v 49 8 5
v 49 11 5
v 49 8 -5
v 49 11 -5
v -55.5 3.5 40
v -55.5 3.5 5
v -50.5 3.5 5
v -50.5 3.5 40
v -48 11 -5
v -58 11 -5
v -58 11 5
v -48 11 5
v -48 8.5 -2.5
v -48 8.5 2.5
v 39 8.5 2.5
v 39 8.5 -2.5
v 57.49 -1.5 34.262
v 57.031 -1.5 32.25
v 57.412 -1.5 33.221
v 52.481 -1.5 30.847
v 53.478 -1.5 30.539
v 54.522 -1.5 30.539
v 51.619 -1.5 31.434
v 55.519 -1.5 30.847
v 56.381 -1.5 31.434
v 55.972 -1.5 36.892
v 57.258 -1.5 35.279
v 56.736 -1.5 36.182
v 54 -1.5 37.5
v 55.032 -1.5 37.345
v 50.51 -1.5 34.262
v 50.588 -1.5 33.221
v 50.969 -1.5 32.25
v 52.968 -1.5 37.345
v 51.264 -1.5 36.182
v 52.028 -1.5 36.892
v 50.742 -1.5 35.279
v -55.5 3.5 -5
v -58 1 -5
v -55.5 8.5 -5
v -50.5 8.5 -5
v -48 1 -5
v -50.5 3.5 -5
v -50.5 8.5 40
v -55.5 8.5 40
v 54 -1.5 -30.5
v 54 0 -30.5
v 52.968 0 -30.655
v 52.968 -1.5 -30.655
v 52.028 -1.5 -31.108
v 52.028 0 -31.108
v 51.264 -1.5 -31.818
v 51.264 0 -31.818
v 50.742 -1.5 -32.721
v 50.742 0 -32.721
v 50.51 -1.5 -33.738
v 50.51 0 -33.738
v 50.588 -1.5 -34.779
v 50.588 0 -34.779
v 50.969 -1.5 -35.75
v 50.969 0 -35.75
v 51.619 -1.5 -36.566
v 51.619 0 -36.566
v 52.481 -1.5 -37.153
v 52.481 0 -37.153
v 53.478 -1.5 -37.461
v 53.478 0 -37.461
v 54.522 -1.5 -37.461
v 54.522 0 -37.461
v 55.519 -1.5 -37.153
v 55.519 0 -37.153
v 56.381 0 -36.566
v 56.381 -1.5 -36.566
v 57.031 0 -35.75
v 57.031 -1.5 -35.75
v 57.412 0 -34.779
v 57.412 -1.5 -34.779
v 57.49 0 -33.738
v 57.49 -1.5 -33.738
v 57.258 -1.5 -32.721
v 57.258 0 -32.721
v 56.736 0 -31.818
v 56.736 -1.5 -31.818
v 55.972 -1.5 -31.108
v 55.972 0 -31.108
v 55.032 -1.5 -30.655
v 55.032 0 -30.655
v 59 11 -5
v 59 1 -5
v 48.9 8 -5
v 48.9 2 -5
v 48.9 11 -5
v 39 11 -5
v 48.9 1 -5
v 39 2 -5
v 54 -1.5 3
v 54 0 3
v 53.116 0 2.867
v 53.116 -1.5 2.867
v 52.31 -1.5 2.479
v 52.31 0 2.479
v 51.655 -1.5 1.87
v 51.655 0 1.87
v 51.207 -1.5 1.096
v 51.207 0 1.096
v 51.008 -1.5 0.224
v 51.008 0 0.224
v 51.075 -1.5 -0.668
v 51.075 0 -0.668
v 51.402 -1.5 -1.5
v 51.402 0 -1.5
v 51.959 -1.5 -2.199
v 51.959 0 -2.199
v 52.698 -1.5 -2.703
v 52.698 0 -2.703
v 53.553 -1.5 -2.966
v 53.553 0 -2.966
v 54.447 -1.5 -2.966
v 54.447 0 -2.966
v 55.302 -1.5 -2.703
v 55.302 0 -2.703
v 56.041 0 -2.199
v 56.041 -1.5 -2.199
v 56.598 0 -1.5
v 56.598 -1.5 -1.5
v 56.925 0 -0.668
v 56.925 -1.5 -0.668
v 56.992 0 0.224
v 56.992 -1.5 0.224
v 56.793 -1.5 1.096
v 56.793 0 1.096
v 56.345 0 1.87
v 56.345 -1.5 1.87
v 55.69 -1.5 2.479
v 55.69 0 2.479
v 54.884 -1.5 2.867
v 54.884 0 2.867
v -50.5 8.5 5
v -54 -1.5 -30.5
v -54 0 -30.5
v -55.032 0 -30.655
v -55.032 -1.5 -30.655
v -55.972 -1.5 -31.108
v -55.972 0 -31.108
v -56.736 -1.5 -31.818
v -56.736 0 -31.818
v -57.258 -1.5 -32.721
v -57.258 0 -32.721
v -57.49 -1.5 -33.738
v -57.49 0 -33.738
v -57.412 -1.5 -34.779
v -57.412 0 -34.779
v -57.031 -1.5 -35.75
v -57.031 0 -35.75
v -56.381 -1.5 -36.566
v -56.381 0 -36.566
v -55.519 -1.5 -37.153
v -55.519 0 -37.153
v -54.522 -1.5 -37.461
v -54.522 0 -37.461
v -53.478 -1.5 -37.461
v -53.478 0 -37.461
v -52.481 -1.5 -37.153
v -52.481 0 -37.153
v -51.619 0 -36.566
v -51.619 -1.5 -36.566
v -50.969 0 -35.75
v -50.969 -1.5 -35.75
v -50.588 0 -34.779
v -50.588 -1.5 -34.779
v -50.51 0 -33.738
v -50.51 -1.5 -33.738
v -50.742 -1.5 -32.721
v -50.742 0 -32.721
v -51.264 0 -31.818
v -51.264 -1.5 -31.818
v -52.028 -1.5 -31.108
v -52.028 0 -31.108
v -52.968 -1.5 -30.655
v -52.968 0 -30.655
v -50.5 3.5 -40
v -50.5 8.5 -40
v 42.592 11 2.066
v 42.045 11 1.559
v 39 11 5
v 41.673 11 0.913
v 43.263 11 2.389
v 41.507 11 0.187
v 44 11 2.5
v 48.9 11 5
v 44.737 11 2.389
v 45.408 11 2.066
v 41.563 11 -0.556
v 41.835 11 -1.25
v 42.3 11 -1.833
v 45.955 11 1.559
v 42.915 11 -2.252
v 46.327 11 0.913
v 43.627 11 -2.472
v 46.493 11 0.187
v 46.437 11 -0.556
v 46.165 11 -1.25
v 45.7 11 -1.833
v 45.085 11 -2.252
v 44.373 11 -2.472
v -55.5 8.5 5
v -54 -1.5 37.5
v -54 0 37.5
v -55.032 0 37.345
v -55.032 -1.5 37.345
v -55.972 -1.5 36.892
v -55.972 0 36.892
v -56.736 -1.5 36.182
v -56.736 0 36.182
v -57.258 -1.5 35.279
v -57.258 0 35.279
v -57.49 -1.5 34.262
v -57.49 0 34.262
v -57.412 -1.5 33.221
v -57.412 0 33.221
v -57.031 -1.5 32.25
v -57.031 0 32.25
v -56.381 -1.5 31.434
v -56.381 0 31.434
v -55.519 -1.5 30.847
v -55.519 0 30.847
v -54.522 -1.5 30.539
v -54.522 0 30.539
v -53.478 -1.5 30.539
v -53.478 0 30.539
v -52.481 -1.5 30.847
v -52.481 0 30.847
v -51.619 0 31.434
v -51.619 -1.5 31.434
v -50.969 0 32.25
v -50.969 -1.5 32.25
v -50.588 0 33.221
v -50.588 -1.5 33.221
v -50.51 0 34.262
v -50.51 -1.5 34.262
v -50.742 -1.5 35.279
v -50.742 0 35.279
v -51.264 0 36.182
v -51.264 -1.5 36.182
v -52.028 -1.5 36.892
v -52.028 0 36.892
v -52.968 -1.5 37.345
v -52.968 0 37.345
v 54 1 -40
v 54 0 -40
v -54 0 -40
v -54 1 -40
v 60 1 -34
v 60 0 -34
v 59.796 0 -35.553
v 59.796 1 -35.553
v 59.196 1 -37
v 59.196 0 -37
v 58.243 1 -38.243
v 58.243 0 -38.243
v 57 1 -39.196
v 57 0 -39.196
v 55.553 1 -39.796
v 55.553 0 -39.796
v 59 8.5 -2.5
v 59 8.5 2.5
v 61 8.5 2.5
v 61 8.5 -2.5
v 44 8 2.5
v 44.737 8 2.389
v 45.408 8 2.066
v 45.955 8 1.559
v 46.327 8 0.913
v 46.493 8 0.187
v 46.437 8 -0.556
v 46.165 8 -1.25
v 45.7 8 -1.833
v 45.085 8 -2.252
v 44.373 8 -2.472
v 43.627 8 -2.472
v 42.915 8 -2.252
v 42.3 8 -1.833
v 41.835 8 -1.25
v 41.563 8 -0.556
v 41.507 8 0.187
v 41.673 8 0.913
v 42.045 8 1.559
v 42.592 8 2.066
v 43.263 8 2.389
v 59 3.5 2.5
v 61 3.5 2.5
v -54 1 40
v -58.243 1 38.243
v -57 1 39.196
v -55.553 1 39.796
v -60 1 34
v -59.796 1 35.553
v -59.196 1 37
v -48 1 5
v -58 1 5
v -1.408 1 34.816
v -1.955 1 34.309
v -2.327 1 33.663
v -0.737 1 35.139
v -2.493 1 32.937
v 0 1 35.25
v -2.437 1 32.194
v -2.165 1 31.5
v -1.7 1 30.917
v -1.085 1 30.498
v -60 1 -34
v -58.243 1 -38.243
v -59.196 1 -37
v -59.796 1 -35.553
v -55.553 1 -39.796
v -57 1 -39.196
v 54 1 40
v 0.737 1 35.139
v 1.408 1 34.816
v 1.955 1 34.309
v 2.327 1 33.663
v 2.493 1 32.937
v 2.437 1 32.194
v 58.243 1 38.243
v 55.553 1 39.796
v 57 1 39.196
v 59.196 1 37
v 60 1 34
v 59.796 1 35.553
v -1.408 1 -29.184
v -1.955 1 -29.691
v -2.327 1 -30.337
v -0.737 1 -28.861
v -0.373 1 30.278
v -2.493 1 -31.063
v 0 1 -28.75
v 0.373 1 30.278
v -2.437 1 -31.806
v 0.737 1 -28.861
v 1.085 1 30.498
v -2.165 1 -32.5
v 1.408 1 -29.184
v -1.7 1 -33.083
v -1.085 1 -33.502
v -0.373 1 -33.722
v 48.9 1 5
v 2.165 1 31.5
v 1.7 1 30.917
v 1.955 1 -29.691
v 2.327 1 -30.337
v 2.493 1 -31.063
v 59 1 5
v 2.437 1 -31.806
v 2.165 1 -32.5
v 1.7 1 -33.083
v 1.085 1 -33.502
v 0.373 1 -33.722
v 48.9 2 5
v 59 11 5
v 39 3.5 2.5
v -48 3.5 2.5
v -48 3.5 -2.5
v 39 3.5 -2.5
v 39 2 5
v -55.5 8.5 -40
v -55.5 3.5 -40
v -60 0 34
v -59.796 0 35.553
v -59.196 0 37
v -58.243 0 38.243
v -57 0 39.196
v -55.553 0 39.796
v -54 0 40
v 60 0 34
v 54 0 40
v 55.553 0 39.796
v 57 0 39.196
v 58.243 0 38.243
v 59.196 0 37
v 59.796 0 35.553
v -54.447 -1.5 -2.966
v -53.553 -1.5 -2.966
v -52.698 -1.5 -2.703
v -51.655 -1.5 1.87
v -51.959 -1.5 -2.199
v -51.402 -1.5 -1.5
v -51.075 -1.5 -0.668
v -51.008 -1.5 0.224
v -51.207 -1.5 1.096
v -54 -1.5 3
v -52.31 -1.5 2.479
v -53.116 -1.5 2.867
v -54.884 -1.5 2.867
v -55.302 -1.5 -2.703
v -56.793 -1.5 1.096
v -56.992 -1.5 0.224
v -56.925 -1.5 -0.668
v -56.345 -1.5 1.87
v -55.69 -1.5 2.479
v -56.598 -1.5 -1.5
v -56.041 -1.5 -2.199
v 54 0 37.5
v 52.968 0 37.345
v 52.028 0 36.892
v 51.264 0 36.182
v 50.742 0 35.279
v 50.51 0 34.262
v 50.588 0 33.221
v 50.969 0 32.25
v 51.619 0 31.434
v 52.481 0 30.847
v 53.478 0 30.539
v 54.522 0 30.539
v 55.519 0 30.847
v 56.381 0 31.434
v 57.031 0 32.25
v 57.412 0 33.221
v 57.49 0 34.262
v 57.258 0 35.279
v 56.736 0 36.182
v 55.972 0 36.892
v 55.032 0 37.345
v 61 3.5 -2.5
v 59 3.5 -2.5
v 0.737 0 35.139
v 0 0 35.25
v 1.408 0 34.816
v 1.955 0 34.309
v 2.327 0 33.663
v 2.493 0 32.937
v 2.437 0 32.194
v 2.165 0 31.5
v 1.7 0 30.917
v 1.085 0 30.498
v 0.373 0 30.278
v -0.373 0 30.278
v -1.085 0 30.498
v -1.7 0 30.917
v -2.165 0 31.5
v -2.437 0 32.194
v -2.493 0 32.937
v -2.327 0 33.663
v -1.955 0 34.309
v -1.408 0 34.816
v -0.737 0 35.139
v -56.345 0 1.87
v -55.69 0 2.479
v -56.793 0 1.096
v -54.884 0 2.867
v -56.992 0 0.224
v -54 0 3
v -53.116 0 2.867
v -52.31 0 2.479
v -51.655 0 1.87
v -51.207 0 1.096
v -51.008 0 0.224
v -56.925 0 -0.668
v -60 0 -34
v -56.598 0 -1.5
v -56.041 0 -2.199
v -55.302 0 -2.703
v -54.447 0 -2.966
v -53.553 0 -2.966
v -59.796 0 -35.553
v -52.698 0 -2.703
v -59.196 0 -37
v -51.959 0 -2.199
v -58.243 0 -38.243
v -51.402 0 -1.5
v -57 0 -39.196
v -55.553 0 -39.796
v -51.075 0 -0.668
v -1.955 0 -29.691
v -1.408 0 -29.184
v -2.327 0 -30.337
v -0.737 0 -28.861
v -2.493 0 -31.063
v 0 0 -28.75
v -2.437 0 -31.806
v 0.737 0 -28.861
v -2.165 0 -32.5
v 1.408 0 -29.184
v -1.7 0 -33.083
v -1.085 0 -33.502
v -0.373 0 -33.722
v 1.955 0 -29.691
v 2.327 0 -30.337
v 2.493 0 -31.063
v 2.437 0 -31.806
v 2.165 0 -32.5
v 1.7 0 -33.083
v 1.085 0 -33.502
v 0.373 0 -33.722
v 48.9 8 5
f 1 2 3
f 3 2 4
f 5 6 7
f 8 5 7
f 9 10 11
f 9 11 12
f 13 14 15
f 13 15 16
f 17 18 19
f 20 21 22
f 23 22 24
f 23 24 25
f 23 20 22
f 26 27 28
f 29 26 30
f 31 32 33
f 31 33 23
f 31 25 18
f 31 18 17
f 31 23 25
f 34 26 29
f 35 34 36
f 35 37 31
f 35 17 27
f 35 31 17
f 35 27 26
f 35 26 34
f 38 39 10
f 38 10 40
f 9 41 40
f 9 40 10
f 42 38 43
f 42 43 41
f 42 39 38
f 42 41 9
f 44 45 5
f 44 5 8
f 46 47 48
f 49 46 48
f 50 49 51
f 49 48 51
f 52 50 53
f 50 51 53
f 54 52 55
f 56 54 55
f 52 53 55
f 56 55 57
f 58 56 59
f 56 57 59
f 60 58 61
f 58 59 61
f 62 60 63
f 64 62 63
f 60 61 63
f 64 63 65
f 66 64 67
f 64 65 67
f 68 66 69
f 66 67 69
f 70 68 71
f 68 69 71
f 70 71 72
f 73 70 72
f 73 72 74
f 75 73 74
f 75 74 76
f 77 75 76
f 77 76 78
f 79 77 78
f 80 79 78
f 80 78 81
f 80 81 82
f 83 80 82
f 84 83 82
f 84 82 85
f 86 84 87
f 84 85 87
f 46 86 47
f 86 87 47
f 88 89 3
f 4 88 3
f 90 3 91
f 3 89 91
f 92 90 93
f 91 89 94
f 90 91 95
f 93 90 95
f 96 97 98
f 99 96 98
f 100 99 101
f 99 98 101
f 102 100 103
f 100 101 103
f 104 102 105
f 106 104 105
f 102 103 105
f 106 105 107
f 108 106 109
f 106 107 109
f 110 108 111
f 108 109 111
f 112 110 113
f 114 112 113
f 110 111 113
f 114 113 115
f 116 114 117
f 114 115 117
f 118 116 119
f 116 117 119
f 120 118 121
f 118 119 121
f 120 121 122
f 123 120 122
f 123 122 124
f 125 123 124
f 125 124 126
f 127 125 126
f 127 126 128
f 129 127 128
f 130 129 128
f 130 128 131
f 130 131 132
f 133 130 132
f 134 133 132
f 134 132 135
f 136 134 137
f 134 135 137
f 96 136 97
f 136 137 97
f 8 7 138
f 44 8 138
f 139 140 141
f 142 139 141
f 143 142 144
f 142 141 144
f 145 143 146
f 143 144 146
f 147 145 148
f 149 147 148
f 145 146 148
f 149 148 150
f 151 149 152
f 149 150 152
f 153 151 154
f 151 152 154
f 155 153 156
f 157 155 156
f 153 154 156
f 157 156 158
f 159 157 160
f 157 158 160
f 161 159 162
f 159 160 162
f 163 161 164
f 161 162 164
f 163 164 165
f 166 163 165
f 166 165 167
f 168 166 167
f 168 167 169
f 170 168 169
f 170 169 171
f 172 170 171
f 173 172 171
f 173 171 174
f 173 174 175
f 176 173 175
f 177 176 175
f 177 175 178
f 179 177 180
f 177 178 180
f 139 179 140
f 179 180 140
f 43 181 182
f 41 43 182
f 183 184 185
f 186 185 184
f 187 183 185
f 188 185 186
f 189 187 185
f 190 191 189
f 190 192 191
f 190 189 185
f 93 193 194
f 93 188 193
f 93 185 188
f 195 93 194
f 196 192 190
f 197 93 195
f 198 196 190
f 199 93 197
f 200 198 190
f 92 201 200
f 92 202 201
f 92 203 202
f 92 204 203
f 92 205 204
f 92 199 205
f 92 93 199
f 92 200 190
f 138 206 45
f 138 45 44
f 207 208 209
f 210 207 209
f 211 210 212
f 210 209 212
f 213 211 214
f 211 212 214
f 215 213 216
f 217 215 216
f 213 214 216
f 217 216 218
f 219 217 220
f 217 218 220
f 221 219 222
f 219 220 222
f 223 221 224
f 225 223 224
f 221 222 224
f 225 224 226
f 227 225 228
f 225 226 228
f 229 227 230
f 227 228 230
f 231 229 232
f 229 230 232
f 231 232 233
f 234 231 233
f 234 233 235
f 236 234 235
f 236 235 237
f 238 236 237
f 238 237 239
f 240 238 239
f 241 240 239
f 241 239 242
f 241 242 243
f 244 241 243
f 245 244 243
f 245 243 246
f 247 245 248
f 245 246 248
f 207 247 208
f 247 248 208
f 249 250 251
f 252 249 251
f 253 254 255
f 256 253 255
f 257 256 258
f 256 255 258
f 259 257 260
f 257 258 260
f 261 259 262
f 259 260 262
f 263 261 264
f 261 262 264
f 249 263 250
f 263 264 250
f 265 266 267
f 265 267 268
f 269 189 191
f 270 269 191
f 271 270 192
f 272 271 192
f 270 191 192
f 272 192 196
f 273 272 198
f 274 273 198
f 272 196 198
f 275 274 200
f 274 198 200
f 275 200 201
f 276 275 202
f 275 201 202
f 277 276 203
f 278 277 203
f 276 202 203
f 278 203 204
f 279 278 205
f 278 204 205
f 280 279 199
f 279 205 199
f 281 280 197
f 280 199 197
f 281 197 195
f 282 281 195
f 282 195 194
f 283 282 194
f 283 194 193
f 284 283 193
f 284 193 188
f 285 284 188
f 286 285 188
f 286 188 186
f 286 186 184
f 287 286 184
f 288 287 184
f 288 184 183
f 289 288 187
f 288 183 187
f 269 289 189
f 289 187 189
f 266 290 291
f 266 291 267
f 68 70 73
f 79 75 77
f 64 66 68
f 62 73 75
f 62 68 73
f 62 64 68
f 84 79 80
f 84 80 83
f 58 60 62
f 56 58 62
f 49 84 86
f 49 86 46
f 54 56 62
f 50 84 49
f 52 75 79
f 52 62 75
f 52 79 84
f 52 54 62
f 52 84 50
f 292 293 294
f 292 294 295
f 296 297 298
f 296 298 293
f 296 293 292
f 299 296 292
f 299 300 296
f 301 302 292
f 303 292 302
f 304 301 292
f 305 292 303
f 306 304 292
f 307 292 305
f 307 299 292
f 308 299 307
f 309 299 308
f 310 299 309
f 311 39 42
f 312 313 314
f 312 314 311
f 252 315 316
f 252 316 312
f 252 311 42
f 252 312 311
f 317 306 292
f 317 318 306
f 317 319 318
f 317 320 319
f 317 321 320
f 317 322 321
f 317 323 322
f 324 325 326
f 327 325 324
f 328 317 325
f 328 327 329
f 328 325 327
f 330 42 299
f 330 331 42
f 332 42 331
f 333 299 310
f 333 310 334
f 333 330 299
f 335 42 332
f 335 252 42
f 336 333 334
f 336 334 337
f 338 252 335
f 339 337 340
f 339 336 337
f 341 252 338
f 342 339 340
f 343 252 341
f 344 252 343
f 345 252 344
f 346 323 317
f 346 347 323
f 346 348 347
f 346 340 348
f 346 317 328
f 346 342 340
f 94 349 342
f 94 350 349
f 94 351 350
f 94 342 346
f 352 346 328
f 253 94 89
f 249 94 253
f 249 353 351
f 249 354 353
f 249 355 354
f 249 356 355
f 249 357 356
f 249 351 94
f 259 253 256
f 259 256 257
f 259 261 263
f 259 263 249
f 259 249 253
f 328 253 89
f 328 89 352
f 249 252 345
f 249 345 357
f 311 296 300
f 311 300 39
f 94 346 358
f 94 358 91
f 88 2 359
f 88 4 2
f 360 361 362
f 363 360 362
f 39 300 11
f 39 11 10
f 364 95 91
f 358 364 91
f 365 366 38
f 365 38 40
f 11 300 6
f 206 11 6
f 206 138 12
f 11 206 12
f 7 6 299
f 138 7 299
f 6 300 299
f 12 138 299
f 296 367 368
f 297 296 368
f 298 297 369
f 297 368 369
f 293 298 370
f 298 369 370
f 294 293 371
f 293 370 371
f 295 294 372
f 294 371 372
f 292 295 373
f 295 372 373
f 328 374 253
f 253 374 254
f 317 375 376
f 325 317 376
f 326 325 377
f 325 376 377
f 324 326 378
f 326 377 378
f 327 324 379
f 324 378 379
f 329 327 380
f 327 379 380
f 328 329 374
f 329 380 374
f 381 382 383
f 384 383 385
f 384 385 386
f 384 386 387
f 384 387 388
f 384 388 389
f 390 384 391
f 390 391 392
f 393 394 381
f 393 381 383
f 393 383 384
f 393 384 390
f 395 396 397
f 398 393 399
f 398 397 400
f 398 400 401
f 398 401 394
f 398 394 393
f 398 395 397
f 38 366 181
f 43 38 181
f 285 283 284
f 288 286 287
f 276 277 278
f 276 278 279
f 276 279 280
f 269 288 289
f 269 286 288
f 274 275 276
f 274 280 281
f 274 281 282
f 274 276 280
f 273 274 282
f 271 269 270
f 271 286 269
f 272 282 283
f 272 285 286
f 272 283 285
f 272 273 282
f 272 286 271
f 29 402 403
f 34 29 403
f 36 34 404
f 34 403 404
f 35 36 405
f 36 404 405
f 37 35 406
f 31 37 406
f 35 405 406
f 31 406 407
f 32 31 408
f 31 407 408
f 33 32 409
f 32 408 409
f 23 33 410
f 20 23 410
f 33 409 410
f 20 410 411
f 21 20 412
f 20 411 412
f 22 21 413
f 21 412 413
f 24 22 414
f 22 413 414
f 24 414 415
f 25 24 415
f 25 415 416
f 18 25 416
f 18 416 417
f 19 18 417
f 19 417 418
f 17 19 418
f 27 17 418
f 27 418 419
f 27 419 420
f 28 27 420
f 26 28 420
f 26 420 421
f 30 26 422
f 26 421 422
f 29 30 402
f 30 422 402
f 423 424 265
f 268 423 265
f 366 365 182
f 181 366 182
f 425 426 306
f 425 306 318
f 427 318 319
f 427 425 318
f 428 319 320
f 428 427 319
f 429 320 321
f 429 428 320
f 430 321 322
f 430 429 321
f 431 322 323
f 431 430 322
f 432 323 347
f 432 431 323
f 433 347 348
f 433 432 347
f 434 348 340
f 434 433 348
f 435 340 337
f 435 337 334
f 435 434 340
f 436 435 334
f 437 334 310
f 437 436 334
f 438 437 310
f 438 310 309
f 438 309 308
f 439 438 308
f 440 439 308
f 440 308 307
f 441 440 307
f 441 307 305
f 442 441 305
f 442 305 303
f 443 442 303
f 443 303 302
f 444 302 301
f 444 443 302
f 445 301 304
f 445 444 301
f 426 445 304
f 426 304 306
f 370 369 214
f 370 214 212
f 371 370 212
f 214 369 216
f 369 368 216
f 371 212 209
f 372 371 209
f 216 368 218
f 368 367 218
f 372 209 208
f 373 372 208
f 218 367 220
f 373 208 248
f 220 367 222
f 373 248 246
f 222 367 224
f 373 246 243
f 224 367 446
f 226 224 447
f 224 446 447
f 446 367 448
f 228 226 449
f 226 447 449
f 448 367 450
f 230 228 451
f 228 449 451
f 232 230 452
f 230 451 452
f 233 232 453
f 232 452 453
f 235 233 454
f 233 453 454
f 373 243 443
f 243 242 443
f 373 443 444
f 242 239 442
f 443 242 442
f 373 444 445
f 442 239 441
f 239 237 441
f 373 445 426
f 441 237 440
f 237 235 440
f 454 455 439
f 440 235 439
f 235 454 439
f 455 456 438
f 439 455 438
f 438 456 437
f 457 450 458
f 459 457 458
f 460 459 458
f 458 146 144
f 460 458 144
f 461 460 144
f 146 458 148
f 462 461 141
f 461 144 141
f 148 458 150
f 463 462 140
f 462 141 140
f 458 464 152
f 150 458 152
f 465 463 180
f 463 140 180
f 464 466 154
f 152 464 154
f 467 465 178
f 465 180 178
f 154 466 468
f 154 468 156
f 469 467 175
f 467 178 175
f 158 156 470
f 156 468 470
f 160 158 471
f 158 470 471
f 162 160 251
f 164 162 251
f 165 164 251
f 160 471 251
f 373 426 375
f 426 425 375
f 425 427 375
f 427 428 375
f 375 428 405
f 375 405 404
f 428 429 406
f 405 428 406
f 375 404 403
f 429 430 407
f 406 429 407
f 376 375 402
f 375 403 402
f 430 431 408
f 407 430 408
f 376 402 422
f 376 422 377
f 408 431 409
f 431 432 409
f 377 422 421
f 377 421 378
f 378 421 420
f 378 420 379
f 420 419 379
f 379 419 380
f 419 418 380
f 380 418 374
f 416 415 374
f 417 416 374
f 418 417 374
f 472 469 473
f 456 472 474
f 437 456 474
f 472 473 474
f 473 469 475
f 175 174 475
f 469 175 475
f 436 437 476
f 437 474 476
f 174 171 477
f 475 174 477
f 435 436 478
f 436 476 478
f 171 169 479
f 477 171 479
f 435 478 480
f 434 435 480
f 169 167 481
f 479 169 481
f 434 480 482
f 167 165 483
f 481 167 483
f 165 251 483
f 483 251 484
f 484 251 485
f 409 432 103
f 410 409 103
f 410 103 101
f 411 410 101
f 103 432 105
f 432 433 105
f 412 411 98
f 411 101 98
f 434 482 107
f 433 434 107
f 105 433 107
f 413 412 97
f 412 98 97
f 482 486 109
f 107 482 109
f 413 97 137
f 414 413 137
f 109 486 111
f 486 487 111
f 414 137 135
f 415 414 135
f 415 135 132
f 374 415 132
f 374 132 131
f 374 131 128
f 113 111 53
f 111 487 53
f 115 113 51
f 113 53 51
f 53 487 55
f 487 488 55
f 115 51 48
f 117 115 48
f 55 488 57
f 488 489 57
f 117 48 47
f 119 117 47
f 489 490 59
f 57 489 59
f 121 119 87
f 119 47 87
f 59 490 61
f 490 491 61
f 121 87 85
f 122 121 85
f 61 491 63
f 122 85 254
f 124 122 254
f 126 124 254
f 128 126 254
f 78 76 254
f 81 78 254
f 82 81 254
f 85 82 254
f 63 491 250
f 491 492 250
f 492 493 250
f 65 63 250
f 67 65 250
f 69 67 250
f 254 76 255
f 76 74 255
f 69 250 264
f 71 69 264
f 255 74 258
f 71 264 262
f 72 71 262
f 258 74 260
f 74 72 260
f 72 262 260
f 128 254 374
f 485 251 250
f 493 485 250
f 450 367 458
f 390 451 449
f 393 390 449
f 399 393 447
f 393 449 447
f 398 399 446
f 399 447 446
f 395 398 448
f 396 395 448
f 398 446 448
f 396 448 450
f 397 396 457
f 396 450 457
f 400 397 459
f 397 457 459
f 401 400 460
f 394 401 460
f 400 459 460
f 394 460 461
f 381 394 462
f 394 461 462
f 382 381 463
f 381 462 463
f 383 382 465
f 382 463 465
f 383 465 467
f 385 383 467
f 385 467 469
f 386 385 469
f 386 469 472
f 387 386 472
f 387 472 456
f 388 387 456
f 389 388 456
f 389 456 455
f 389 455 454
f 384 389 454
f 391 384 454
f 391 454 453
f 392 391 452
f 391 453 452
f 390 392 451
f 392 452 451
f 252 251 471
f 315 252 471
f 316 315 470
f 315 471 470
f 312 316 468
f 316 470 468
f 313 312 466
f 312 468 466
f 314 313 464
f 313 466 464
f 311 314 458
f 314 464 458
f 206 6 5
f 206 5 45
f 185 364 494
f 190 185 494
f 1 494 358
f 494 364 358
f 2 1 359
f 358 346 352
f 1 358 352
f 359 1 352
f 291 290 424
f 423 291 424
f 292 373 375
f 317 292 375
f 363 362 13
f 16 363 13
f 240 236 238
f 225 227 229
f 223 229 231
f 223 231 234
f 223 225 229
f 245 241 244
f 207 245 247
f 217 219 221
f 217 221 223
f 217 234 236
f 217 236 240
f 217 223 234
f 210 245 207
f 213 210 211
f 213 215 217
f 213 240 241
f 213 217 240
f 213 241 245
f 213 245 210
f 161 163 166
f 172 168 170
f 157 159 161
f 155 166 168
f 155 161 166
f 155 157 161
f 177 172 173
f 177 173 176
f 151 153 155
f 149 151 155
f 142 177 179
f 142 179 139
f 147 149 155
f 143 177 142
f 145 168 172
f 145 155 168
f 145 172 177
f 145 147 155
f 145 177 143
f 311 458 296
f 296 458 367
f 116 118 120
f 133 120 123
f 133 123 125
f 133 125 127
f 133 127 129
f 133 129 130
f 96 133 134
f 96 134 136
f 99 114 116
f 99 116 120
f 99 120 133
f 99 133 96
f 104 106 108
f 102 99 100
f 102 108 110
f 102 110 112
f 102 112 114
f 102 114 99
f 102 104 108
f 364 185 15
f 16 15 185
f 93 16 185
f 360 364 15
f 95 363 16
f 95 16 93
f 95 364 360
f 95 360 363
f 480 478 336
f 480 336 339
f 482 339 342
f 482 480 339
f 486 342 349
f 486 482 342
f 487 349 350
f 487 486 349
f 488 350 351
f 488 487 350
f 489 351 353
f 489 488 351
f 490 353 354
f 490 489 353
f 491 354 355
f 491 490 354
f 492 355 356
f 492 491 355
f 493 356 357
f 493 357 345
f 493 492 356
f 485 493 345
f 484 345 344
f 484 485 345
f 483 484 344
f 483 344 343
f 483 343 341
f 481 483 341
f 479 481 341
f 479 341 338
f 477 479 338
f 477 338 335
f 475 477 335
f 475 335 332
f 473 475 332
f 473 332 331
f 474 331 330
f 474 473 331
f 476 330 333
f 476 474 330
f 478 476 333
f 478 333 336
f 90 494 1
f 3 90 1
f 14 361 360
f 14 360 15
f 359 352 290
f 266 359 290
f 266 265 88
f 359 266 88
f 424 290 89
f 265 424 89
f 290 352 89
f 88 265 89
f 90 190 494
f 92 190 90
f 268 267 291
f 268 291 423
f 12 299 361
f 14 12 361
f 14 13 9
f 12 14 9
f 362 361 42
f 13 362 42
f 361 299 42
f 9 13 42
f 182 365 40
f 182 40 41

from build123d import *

# Parameters (mm, degrees)
SKETCH1_R                = 2.5
BOSS_EXTRUDE1_DEPTH      = 1
SKETCH2_R                = 3.5
SKETCH2_R_2              = 3
BOSS_EXTRUDE2_DEPTH      = 1.5
SKETCH3_W                = 10
SKETCH3_H                = 10
BOSS_EXTRUDE3_DEPTH      = 10
BOSS_EXTRUDE4_DEPTH      = 35
BOSS_EXTRUDE4_DEPTH_BACK = 45
SKETCH4_W                = 5
SKETCH4_H                = 5
BOSS_EXTRUDE5_DEPTH      = 2
BOSS_EXTRUDE5_DEPTH_BACK = 110
SKETCH5_W                = 5
SKETCH5_H                = 5
CUT_EXTRUDE4_START       = -10
SKETCH6_W                = 9.9
SKETCH6_H                = 10
SKETCH6_R                = 2.5
CUT_EXTRUDE4_DEPTH       = 1
SKETCH6_3_R              = 2.5
SKETCH6_3_W              = 0.1
SKETCH6_3_H              = 10
CUT_EXTRUDE5_DEPTH       = 3


with BuildPart() as part:
    # Sketch1 → Boss-Extrude1 (new body)
    with BuildSketch(Plane(origin=(0, 0, 0), x_dir=(1, 0, 0), z_dir=(0, 1, 0))):
        with BuildLine():
            Line((-54, -40), (54, -40))
            ThreePointArc((54, -40), (58.242640687, -38.242640687), (60, -34))
            Line((60, -34), (60, 34))
            ThreePointArc((60, 34), (58.242640687, 38.242640687), (54, 40))
            Line((54, 40), (-54, 40))
            ThreePointArc((-54, 40), (-58.242640687, 38.242640687), (-60, 34))
            Line((-60, 34), (-60, -34))
            ThreePointArc((-60, -34), (-58.242640687, -38.242640687), (-54, -40))
        make_face()
        with Locations(Location((0, 31.25, 0), (0, 0, 270))):
            Circle(SKETCH1_R, mode=Mode.SUBTRACT)
        with Locations(Location((0, -32.75, 0), (0, 0, 270))):
            Circle(SKETCH1_R, mode=Mode.SUBTRACT)
    extrude(amount=BOSS_EXTRUDE1_DEPTH)

    # Sketch2 → Boss-Extrude2 (add)
    with BuildSketch(Plane.XZ):
        with Locations(Location((-54, 34, 0), (0, 0, 90))):
            Circle(SKETCH2_R)
        with Locations(Location((-54, 0, 0), (0, 0, 90))):
            Circle(SKETCH2_R_2)
        with Locations(Location((-54, -34, 0), (0, 0, 90))):
            Circle(SKETCH2_R)
        with Locations(Location((54, 34, 0), (0, 0, 90))):
            Circle(SKETCH2_R)
        with Locations(Location((54, -34, 0), (0, 0, 90))):
            Circle(SKETCH2_R)
        with Locations(Location((54, 0, 0), (0, 0, 90))):
            Circle(SKETCH2_R_2)
    extrude(amount=BOSS_EXTRUDE2_DEPTH)

    # Sketch3 → Boss-Extrude3 (add)
    with BuildSketch(Plane(origin=(0, 1, 0), x_dir=(1, 0, 0), z_dir=(0, 1, 0))):
        with Locations((54, 0)):
            Rectangle(SKETCH3_W, SKETCH3_H)
        with Locations((44, 0)):
            Rectangle(SKETCH3_W, SKETCH3_H)
        with Locations((-53, 0)):
            Rectangle(SKETCH3_W, SKETCH3_H)
    extrude(amount=BOSS_EXTRUDE3_DEPTH)

    # Sketch4 → Boss-Extrude4 (add, two sides: drawn at the far end of the back side and taken through both)
    with BuildSketch(Plane.XY.offset(5).offset(-BOSS_EXTRUDE4_DEPTH_BACK)):
        with Locations((-53, 6)):
            Rectangle(SKETCH4_W, SKETCH4_H)
    extrude(amount=BOSS_EXTRUDE4_DEPTH + BOSS_EXTRUDE4_DEPTH_BACK)

    # Sketch5 → Boss-Extrude5 (add, two sides: drawn at the far end of the back side and taken through both)
    with BuildSketch(Plane(origin=(59, 0, 0), x_dir=(0, 0, -1), z_dir=(1, 0, 0)).offset(-BOSS_EXTRUDE5_DEPTH_BACK)):
        with Locations((0, 6)):
            Rectangle(SKETCH5_W, SKETCH5_H)
    extrude(amount=BOSS_EXTRUDE5_DEPTH + BOSS_EXTRUDE5_DEPTH_BACK)

    # Sketch6 → Cut-Extrude4 (cut)
    # profile 1 of 2: a face of its own
    with BuildSketch(Plane(origin=(0, 11, 0), x_dir=(1, 0, 0), z_dir=(0, 1, 0)).offset(CUT_EXTRUDE4_START)):
        with Locations((43.95, 0)):
            Rectangle(SKETCH6_W, SKETCH6_H)
        with Locations((44, 0)):
            Circle(SKETCH6_R, mode=Mode.SUBTRACT)
    # profile 2 of 2: a face of its own
    with BuildSketch(Plane(origin=(0, 11, 0), x_dir=(1, 0, 0), z_dir=(0, 1, 0)).offset(CUT_EXTRUDE4_START)):
        with Locations((44, 0)):
            Circle(SKETCH6_R)
    extrude(amount=CUT_EXTRUDE4_DEPTH, mode=Mode.SUBTRACT)

    # Sketch6<3> → Cut-Extrude5 (cut)
    with BuildSketch(Plane(origin=(0, 11, 0), x_dir=(1, 0, 0), z_dir=(0, 1, 0))):
        with Locations(Location((44, 0, 0), (0, 0, 270))):
            Circle(SKETCH6_3_R)
        with Locations((48.95, 0)):
            Rectangle(SKETCH6_3_W, SKETCH6_3_H)
    extrude(amount=-CUT_EXTRUDE5_DEPTH, mode=Mode.SUBTRACT)


solid = part.part
